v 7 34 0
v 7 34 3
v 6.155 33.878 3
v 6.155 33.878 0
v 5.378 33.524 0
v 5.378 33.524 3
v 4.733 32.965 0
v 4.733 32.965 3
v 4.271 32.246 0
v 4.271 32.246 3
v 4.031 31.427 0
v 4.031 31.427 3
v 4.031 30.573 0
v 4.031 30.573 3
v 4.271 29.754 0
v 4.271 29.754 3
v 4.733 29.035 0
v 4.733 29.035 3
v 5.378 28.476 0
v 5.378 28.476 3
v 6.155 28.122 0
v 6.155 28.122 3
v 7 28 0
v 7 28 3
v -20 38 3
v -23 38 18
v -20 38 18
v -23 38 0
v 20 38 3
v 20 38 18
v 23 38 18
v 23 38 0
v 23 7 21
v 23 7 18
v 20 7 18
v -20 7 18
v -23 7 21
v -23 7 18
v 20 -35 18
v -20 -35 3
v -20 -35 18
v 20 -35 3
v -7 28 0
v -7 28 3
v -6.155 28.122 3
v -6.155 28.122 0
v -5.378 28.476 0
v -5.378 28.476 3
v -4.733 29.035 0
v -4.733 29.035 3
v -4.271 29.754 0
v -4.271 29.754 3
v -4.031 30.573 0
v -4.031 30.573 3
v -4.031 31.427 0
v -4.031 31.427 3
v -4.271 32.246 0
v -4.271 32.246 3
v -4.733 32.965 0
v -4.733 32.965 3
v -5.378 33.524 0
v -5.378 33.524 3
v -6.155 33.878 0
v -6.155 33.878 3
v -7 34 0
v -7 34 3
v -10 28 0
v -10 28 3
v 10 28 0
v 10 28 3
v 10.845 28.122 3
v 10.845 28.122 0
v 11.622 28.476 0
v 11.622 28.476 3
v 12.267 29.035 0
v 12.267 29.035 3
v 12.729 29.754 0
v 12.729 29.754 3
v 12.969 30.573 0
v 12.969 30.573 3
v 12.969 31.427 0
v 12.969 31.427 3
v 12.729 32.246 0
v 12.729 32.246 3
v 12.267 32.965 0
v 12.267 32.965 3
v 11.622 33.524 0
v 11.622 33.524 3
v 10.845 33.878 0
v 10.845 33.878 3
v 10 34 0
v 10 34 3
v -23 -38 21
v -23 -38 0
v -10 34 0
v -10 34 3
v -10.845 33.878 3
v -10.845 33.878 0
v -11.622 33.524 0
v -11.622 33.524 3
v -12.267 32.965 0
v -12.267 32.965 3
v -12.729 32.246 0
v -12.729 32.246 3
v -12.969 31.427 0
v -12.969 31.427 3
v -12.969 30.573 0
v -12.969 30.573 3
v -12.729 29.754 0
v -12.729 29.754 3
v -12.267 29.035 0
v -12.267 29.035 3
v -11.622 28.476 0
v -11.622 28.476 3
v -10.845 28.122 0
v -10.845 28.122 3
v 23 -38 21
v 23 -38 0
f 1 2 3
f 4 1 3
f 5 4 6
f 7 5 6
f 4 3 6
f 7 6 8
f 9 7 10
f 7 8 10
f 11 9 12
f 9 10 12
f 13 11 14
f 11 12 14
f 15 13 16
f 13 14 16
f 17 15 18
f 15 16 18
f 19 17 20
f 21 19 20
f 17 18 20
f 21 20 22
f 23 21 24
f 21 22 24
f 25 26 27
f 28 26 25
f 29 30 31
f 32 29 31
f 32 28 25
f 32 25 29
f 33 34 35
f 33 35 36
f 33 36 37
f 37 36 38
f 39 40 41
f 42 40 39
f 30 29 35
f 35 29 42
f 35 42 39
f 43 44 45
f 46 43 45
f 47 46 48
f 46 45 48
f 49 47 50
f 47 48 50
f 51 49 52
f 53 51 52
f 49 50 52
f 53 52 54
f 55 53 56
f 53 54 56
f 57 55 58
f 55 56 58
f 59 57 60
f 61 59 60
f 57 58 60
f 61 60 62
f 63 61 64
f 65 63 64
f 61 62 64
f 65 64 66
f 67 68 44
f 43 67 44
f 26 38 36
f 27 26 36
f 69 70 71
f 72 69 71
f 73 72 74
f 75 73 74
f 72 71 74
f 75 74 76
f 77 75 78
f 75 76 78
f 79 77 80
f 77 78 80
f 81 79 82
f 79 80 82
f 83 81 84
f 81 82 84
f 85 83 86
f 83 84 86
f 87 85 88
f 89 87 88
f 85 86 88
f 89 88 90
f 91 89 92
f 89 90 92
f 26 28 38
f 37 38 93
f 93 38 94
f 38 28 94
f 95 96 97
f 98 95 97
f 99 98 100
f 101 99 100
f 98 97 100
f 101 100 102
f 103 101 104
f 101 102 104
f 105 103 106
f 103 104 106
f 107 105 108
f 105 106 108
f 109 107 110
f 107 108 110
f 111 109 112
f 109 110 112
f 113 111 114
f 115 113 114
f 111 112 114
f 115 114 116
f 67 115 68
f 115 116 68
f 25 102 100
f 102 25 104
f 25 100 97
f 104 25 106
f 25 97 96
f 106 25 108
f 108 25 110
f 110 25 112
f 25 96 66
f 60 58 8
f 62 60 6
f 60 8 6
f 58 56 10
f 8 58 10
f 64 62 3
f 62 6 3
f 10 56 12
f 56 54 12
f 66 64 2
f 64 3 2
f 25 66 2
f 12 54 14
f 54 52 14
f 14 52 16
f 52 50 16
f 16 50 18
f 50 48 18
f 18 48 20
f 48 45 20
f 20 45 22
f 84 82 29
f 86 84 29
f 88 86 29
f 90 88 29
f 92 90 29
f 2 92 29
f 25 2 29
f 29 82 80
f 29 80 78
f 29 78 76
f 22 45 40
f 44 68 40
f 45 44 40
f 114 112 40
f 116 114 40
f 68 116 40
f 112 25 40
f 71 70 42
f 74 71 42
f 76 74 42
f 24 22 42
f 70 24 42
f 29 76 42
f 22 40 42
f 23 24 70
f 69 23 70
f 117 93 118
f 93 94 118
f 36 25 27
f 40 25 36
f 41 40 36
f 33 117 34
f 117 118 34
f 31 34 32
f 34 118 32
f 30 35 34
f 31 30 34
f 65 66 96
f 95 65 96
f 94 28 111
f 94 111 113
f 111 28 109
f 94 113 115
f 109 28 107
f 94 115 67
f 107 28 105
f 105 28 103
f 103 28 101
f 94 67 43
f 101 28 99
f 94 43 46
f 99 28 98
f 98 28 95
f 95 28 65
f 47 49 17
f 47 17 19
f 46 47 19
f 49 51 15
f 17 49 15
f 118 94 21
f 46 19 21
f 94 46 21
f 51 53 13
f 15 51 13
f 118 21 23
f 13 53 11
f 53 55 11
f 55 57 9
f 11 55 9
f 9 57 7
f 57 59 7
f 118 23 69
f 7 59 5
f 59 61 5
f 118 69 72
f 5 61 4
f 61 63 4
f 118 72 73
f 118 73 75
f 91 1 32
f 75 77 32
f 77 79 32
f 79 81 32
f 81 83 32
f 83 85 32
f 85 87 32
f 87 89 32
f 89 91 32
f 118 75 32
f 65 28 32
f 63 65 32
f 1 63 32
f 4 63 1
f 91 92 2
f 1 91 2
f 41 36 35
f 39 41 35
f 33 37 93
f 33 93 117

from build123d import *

# Parameters (mm, degrees)
F0_W     = 46
F0_H     = 76
F1_DEPTH = 3
F2_W     = 46
F2_H     = 76
F2_W_2   = 40
F2_H_2   = 70
F3_DEPTH = 15
F5_DEPTH = 25
F6_W     = 40
F6_H     = 42
F7_DEPTH = 3
F8_DEPTH = 25


with BuildPart() as f1:
    # F0 (on Top) → F1 (new body)
    with BuildSketch(Plane.XY):
        Rectangle(F0_W, F0_H)
    extrude(amount=F1_DEPTH)

    # F2 (on face) → F3 (join)
    with BuildSketch(Plane.XY.offset(3)):
        Rectangle(F2_W, F2_H)
        Rectangle(F2_W_2, F2_H_2, mode=Mode.SUBTRACT)
    extrude(amount=F3_DEPTH)

    # F4 (on face) → F5 (cut)
    with BuildSketch(Plane.XY.offset(3)):
        with BuildLine():
            Line((-10, 28), (-7.0000000819, 28))
            ThreePointArc((-7, 28), (-4, 31.000000041), (-7.0000000819, 34))
            Line((-7.0000000819, 34), (-10, 34))
            ThreePointArc((-10, 34), (-13, 31), (-10, 28))
        make_face()
        with BuildLine():
            Line((10, 34), (7, 34))
            ThreePointArc((7, 34), (4, 31), (7, 28))
            Line((7, 28), (10, 28))
            ThreePointArc((10, 28), (13, 31), (10, 34))
        make_face()
    extrude(amount=-F5_DEPTH, mode=Mode.SUBTRACT)

    # F6 (on face) → F7 (join)
    with BuildSketch(Plane.XY.offset(18)):
        Polygon((-23, 7), (-23, -38), (23, -38), (23, 7), (20, 7), (20, -35), (-20, -35), (-20, 7), align=None)
        with Locations((0, -14)):
            Rectangle(F6_W, F6_H)
    extrude(amount=F7_DEPTH)

    # F8 (cut): a face of the model
    f8_faces = [f1.faces().sort_by_distance(p)[0] for p in [
        (0, 35, 10.5),
    ]]
    extrude(f8_faces, amount=-F8_DEPTH, mode=Mode.SUBTRACT)


solid = f1.part
